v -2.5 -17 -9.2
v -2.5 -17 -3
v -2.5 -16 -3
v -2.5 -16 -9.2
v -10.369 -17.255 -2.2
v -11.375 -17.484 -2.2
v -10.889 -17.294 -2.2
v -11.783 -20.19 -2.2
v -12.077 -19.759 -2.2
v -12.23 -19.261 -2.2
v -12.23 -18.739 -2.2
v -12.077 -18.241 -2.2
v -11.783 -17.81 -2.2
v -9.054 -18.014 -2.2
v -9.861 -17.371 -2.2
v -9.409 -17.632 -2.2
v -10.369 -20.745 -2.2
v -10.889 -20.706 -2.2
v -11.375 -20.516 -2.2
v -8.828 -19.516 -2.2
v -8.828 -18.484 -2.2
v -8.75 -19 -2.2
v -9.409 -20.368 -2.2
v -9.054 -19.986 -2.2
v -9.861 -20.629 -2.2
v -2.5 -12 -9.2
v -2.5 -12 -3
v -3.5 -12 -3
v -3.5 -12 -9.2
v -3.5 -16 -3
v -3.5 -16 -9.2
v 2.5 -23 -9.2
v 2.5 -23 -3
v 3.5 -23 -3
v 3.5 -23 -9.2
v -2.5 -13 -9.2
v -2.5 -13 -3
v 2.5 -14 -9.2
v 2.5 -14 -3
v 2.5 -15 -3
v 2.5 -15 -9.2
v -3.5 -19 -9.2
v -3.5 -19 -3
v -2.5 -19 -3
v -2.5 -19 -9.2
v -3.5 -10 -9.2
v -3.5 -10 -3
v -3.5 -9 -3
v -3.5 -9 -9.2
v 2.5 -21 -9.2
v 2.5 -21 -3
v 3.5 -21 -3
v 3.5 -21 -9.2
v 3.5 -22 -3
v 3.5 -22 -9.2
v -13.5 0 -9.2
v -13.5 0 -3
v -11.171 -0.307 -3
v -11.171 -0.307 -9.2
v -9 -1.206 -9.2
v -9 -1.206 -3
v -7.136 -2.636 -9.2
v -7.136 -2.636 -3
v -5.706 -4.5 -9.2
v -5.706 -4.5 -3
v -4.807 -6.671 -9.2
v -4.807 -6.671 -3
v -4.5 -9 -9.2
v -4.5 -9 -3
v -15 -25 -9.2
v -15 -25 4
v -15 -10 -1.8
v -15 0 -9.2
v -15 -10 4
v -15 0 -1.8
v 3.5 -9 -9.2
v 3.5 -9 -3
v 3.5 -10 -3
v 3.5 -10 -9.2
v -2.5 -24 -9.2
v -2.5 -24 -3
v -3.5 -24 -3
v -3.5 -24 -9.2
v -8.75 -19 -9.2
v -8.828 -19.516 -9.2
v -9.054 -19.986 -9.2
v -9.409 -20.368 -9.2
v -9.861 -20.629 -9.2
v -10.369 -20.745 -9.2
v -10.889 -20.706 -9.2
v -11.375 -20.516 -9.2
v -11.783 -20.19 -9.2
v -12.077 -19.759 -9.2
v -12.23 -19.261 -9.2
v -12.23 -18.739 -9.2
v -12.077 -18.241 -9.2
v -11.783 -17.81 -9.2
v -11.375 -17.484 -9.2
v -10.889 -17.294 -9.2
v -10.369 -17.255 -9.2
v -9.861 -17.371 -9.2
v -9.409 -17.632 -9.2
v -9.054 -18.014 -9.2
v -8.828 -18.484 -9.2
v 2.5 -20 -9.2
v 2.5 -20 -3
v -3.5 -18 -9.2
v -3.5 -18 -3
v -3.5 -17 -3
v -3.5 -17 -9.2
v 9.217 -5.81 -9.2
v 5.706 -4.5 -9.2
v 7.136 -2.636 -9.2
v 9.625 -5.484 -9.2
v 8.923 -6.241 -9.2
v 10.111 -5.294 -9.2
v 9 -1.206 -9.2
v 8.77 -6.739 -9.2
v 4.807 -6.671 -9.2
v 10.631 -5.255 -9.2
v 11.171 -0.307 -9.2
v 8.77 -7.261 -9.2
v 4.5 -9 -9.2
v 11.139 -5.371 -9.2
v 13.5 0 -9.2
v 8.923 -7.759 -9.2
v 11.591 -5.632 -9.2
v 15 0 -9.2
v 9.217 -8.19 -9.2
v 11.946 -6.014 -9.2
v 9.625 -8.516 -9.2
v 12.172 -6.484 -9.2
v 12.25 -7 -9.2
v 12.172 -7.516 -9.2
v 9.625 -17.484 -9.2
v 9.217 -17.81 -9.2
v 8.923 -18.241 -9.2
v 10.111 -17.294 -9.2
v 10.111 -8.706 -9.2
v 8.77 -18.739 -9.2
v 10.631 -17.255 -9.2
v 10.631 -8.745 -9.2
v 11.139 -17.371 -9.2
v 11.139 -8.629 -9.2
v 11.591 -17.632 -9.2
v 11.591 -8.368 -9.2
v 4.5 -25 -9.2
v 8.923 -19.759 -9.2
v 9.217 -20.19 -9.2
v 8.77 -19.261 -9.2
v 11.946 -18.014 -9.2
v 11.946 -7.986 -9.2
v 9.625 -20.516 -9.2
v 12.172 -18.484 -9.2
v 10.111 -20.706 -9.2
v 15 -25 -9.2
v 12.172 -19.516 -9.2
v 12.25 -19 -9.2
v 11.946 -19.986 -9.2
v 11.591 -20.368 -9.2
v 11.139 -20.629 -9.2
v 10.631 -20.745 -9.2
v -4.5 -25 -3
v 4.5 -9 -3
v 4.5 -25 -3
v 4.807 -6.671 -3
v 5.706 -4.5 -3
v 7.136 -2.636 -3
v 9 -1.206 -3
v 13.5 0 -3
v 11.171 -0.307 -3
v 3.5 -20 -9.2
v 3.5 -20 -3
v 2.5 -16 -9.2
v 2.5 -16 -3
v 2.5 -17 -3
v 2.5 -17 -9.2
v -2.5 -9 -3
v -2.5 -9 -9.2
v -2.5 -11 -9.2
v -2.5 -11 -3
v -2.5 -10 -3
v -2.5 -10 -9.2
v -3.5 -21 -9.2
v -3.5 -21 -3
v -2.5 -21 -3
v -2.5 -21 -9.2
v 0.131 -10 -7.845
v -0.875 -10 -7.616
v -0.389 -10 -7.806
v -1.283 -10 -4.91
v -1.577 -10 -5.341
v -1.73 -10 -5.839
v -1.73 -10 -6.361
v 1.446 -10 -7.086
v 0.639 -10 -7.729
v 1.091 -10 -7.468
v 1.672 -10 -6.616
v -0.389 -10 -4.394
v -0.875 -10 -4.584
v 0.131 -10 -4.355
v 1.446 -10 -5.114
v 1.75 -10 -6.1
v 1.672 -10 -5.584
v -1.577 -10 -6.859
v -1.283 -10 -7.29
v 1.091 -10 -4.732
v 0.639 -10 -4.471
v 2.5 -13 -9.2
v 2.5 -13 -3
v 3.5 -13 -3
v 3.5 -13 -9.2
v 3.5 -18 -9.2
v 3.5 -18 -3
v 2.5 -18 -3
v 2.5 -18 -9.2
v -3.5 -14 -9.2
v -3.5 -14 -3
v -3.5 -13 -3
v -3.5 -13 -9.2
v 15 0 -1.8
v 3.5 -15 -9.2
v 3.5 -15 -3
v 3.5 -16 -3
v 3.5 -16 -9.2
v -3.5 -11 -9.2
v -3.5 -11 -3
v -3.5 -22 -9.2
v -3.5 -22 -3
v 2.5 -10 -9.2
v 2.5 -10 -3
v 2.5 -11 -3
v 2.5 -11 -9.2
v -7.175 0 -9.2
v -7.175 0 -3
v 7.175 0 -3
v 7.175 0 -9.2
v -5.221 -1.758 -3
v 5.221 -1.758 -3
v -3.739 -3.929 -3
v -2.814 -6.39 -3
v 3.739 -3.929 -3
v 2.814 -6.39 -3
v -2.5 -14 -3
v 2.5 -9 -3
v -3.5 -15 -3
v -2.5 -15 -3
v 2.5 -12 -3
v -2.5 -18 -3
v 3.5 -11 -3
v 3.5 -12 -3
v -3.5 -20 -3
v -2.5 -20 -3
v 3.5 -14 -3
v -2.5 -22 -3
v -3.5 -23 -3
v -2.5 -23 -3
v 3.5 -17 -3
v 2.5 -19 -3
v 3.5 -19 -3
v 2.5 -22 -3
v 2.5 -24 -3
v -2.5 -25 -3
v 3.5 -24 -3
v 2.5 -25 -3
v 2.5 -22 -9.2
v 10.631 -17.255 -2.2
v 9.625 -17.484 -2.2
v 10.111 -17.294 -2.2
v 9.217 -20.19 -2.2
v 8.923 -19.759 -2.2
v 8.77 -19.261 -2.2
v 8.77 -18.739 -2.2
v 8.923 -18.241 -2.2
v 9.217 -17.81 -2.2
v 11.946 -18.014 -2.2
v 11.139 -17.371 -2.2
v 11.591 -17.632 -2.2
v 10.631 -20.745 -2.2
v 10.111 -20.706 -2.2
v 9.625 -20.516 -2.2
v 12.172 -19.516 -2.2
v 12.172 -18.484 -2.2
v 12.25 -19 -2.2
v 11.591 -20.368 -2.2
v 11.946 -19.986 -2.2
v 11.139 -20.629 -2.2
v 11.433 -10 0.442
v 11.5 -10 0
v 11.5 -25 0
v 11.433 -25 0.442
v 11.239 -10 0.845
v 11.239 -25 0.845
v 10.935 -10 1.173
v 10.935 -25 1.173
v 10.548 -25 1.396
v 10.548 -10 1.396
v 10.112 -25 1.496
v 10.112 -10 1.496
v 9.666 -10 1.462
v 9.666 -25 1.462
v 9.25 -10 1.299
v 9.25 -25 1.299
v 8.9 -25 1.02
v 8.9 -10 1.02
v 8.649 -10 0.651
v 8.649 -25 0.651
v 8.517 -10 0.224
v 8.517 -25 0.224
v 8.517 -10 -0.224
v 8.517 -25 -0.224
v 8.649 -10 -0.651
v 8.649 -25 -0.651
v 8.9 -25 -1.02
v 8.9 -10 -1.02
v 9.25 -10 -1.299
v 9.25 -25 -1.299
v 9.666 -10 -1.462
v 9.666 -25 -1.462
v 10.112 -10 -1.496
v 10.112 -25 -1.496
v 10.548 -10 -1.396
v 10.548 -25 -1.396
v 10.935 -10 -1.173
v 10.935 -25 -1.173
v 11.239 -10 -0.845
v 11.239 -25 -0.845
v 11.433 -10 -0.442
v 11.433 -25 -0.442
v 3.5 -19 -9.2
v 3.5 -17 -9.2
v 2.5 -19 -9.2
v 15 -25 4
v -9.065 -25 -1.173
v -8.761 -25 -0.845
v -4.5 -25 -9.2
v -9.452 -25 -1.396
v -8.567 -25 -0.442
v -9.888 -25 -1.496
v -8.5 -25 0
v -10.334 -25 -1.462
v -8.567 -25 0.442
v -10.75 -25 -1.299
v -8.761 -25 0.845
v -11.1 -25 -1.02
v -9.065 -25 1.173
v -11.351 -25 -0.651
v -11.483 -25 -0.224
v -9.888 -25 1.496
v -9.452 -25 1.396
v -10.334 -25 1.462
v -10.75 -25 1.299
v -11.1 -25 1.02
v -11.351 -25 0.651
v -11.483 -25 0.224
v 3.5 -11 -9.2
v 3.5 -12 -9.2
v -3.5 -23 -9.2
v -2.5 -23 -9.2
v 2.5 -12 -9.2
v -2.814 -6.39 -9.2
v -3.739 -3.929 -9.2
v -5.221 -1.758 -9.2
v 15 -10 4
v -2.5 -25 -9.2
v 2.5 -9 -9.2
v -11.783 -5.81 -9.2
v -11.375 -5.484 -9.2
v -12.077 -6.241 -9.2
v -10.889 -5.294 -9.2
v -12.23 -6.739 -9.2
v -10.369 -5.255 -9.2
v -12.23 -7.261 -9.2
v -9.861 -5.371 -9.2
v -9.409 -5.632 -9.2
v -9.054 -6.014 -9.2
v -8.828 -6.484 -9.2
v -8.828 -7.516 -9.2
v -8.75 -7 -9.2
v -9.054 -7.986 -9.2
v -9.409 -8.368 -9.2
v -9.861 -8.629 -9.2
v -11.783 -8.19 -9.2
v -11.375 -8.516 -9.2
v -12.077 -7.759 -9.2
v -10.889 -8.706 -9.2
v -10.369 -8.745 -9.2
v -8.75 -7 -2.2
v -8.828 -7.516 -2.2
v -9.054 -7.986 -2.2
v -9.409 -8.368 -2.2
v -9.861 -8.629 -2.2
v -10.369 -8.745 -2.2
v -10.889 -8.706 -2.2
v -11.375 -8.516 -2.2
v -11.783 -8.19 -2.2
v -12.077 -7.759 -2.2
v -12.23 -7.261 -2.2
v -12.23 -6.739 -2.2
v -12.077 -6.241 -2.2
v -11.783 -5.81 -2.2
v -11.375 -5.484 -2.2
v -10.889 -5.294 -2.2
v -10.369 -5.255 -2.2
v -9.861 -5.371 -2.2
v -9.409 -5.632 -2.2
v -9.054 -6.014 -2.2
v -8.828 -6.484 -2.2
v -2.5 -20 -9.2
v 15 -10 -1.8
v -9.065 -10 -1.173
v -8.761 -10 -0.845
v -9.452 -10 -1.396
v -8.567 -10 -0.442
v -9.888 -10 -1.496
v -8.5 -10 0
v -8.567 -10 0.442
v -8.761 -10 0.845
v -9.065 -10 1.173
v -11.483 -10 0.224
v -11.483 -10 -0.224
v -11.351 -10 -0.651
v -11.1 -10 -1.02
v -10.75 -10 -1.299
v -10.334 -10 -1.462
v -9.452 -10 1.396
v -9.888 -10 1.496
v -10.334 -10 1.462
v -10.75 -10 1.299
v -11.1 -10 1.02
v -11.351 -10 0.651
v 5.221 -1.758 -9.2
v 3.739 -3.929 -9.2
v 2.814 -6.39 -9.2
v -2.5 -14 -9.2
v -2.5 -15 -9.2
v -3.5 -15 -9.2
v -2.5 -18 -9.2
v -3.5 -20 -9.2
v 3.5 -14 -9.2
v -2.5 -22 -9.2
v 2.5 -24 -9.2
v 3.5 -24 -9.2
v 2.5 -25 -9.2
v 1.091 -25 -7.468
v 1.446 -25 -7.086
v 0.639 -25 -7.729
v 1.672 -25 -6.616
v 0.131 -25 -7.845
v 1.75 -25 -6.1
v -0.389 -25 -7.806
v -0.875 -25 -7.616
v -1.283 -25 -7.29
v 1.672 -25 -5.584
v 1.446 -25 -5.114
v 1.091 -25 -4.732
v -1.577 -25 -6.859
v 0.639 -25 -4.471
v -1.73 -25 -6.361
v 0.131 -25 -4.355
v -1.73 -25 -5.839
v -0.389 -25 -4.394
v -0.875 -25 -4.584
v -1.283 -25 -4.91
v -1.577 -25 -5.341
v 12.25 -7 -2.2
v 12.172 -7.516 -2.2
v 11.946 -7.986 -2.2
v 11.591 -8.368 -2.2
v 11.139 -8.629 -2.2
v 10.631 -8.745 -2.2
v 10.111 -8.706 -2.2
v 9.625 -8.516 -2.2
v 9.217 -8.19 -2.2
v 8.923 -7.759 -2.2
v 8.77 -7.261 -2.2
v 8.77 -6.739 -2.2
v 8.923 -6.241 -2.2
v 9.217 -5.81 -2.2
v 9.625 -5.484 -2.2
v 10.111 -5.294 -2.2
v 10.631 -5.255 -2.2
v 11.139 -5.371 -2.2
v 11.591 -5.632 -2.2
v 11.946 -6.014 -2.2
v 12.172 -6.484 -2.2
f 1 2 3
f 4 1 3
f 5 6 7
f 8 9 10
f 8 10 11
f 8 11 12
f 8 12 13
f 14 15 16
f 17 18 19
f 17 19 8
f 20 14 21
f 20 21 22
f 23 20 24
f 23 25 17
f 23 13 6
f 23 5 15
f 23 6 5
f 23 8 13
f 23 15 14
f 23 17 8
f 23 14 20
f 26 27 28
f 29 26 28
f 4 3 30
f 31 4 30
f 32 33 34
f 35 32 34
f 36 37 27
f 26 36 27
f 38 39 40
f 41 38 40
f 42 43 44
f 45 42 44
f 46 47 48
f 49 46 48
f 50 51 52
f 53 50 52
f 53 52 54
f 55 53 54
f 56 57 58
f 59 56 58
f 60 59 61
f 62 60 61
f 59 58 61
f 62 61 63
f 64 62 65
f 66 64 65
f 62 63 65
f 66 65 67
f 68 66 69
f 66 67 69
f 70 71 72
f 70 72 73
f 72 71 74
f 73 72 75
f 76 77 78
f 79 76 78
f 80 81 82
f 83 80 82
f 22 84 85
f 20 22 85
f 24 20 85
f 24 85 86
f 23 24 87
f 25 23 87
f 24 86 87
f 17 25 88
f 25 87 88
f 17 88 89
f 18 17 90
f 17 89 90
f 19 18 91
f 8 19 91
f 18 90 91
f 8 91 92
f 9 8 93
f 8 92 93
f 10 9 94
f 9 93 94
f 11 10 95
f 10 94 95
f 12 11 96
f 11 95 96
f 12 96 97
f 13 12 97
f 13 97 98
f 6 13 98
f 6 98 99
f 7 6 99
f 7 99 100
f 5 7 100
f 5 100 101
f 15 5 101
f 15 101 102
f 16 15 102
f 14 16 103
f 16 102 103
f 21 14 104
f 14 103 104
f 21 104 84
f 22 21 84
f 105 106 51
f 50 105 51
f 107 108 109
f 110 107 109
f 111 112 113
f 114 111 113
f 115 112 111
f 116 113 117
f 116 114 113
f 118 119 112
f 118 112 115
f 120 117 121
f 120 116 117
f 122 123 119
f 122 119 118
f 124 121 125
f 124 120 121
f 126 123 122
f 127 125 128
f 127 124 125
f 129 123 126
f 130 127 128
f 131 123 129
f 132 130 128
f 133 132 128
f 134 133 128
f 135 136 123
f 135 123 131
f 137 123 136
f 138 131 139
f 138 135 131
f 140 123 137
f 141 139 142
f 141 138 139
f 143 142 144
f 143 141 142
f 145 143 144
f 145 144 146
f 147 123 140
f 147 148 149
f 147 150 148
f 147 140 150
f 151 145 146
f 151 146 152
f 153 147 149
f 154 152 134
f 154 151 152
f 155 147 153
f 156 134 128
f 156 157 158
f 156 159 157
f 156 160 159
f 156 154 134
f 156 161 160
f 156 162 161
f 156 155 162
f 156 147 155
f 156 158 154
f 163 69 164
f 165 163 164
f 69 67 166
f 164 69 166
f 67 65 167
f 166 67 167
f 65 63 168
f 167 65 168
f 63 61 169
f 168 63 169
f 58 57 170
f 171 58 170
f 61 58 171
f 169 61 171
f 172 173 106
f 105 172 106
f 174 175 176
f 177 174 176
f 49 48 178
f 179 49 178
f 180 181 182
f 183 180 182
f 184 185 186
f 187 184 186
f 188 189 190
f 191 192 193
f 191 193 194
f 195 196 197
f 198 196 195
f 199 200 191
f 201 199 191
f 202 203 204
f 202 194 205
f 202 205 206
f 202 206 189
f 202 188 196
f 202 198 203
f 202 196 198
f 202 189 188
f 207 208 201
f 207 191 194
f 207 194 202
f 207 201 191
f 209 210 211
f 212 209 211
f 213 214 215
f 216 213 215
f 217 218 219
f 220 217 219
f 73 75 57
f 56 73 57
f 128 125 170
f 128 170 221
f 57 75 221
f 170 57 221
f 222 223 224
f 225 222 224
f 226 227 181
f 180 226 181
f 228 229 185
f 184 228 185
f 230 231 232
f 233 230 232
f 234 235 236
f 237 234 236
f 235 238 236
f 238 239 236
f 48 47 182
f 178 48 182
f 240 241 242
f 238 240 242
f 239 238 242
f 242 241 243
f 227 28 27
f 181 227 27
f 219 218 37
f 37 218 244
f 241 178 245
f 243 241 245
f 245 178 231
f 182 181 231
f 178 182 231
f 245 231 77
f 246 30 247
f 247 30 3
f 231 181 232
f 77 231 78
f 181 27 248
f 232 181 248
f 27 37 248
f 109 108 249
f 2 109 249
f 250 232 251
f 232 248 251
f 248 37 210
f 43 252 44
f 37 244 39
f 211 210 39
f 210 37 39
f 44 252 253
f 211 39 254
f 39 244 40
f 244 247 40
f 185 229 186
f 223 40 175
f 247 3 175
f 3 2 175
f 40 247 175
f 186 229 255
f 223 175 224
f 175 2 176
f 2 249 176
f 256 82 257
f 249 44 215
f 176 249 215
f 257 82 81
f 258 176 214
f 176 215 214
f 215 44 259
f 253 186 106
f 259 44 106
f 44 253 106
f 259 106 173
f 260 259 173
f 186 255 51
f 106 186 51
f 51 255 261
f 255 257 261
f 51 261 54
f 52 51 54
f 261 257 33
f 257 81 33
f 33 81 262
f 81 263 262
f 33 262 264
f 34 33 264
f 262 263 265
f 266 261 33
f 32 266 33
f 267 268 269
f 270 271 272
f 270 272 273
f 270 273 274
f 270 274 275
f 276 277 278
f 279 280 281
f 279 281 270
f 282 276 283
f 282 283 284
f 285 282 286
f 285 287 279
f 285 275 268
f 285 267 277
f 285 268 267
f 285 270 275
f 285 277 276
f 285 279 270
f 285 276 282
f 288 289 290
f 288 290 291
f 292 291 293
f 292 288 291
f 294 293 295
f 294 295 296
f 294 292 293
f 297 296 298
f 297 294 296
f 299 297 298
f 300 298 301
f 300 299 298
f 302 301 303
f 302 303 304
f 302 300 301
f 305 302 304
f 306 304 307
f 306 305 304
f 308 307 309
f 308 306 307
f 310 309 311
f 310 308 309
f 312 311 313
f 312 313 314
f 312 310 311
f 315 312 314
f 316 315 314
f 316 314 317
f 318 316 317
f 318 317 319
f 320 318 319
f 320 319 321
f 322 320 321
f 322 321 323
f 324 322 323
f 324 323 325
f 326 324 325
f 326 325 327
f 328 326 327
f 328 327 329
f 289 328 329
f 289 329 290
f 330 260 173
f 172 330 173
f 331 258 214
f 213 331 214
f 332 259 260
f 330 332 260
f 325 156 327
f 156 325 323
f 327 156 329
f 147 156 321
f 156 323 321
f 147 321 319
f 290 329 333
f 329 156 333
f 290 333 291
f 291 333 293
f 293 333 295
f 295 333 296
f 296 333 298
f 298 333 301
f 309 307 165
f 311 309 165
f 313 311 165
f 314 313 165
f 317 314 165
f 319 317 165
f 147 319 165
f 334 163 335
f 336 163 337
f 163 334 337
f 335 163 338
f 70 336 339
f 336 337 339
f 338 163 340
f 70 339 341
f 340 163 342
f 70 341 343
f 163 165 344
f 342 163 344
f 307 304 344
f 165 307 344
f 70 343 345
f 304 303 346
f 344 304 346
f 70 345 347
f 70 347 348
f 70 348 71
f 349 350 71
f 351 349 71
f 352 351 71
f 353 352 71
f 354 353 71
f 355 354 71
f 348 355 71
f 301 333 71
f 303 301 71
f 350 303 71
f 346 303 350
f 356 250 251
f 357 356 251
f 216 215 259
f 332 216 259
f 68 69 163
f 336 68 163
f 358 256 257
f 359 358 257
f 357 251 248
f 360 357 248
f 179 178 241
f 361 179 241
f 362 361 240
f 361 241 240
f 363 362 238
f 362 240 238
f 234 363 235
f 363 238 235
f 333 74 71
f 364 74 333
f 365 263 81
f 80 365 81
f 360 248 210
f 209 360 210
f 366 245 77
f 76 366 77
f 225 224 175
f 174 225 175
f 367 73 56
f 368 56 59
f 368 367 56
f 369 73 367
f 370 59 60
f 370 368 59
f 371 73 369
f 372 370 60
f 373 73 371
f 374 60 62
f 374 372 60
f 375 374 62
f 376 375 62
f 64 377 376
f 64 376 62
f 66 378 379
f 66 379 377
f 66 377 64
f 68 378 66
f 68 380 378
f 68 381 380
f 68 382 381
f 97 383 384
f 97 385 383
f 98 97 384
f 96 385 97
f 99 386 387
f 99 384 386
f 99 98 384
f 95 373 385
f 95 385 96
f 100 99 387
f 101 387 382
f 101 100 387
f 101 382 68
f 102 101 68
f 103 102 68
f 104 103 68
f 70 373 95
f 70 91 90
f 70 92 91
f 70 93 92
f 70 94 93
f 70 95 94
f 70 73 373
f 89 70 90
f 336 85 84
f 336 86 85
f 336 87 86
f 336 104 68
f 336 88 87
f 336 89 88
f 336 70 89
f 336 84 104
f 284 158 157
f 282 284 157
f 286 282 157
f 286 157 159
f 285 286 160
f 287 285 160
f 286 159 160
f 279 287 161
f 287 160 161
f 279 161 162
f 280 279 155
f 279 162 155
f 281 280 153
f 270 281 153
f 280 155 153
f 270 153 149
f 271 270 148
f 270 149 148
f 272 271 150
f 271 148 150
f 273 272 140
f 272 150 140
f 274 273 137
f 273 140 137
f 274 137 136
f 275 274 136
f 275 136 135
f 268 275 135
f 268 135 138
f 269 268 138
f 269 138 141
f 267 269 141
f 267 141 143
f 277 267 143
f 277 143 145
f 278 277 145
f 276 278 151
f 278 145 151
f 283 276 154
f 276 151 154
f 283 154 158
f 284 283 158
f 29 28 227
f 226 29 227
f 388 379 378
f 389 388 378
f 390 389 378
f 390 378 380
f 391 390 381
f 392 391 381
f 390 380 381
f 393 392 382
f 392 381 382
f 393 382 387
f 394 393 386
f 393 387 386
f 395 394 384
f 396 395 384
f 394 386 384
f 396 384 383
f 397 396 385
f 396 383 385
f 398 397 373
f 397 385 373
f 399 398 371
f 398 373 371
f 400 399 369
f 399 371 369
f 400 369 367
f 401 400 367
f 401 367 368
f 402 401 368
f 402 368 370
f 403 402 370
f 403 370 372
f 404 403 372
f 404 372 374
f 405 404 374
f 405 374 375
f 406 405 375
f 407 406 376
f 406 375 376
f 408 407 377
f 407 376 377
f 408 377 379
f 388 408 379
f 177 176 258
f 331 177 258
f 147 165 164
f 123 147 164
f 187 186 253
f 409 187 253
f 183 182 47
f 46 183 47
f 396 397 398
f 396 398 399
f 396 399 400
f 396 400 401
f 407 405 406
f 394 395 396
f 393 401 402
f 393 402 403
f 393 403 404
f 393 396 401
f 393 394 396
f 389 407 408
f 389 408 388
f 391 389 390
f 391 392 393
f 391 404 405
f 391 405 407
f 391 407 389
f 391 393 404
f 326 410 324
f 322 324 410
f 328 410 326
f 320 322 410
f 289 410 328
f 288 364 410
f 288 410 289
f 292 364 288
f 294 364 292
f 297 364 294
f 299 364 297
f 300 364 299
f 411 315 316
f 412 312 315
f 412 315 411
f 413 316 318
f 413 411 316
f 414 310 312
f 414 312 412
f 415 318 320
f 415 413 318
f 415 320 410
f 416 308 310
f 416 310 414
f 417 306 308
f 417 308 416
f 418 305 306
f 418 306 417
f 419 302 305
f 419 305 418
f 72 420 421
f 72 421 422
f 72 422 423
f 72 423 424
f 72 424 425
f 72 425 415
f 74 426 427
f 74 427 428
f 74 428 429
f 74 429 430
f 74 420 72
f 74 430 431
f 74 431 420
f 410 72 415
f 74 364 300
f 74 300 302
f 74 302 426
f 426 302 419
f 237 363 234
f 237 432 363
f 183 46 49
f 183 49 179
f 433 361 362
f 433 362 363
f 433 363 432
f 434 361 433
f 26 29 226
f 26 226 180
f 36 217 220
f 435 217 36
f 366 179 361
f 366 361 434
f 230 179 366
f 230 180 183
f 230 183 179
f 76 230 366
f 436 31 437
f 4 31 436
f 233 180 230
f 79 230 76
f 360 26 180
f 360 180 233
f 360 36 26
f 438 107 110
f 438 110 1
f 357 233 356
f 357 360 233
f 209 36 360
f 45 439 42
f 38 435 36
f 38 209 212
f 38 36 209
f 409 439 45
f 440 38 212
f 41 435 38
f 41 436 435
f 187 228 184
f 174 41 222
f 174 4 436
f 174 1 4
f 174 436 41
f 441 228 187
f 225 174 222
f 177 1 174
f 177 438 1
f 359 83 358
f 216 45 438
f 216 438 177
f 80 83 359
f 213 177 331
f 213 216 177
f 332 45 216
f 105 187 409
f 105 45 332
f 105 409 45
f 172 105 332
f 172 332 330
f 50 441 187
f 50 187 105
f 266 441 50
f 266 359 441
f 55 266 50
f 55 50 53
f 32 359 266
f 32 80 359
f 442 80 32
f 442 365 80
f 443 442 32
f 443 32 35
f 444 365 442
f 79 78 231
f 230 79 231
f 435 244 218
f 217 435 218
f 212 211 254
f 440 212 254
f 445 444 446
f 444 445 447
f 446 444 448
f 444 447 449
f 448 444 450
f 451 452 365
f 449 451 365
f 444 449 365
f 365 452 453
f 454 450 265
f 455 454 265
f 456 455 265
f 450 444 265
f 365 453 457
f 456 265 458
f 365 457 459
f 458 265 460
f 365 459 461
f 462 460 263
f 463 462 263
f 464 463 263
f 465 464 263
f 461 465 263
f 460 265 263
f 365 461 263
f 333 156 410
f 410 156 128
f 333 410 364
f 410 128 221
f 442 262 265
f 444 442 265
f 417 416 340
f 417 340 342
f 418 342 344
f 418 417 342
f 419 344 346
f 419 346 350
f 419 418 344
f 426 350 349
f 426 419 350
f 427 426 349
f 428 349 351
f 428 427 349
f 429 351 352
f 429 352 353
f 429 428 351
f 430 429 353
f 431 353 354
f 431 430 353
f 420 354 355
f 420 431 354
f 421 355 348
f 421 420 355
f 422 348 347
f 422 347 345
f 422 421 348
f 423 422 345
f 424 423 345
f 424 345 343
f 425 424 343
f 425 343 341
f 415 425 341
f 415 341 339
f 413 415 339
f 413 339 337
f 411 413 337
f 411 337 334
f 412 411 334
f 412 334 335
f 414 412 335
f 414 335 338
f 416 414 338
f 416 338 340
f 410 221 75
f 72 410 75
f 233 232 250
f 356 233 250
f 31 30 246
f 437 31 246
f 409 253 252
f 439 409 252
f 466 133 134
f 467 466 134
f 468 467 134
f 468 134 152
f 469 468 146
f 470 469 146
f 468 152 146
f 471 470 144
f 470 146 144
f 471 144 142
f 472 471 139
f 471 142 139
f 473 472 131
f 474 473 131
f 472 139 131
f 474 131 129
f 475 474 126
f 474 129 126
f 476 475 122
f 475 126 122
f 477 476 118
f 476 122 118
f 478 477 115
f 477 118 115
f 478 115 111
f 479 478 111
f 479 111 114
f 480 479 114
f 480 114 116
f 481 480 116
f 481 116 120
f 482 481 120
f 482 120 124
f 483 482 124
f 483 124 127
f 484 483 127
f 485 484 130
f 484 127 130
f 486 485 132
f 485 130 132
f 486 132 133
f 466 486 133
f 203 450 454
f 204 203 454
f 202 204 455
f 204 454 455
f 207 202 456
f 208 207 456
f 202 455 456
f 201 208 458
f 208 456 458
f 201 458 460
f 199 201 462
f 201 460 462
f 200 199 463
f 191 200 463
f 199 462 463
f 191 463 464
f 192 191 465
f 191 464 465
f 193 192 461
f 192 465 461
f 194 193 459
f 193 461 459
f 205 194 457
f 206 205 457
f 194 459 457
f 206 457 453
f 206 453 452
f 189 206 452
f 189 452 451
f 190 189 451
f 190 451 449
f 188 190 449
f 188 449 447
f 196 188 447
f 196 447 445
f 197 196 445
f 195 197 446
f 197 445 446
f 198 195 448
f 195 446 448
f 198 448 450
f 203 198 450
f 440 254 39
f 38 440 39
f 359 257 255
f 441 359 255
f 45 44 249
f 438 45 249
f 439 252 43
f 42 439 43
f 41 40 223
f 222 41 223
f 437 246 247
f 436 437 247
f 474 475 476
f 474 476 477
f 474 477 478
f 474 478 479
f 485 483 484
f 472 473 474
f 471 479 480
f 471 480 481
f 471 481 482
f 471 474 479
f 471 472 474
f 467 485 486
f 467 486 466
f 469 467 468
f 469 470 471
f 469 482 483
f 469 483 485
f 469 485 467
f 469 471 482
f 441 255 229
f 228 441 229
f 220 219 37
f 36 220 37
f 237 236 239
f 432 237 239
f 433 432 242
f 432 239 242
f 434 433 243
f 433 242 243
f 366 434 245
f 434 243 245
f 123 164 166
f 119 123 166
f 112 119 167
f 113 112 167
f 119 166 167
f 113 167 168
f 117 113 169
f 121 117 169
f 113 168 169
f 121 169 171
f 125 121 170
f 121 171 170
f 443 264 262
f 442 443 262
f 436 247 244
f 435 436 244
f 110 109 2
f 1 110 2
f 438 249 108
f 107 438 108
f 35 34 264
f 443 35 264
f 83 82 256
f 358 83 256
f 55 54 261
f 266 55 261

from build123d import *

# Parameters (mm, degrees)
F0_W      = 30
F0_H      = 7
F0_R      = 1.5
F1_DEPTH  = 25
F3_DEPTH  = 6.2
F4_DEPTH  = 6.2
F5_R      = 1.75
F6_DEPTH  = 15
F7_R      = 1.75
F8_DEPTH  = 7
F9_W      = 30
F9_H      = 5.8
F9_R      = 1.5
F10_DEPTH = 10


with BuildPart() as f1:
    # F0 (on Front) → F1 (new body)
    with BuildSketch(Plane.XZ):
        with Locations((0, 0.5)):
            Rectangle(F0_W, F0_H)
        with Locations((-10, 0)):
            Circle(F0_R, mode=Mode.SUBTRACT)
        with Locations((10, 0)):
            Circle(F0_R, mode=Mode.SUBTRACT)
    extrude(amount=F1_DEPTH)

    # F2 (on face) → F4 (join)
    with BuildSketch(Plane(origin=(0, 0, -3), x_dir=(1, 0, 0), z_dir=(0, 0, -1))):
        with BuildLine():
            Line((-15, 0), (-13.5, 0))
            ThreePointArc((-13.5, 0), (-7.136039, 2.636039), (-4.5, 9))
            Line((-4.5, 9), (-4.5, 25))
            Line((-4.5, 25), (-15, 25))
            Line((-15, 25), (-15, 0))
        make_face()
        with BuildLine():
            Line((4.5, 25), (4.5, 9))
            ThreePointArc((4.5, 9), (7.136039, 2.636039), (13.5, 0))
            Line((13.5, 0), (15, 0))
            Line((15, 0), (15, 25))
            Line((15, 25), (4.5, 25))
        make_face()
    extrude(amount=F4_DEPTH)

    # F7 (on face) → F8 (cut)
    with BuildSketch(Plane(origin=(0, 0, -9.2), x_dir=(1, 0, 0), z_dir=(0, 0, -1))):
        with Locations((10.5, 7)):
            Circle(F7_R)
        with Locations((10.5, 19)):
            Circle(F7_R)
        with Locations((-10.5, 7)):
            Circle(F7_R)
        with Locations((-10.5, 19)):
            Circle(F7_R)
    extrude(amount=-F8_DEPTH, mode=Mode.SUBTRACT)

    # F9 (on face) → F10 (cut)
    with BuildSketch(Plane(origin=(0, 0, 0), x_dir=(-1, 0, 0), z_dir=(0, 1, 0))):
        with Locations((0, 1.1)):
            Rectangle(F9_W, F9_H)
        with Locations((-10, 0)):
            Circle(F9_R, mode=Mode.SUBTRACT)
        with Locations((10, 0)):
            Circle(F9_R, mode=Mode.SUBTRACT)
    extrude(amount=-F10_DEPTH, mode=Mode.SUBTRACT)


with BuildPart() as f3:
    # F2 (on face) → F3 (new body)
    with BuildSketch(Plane(origin=(0, 0, -3), x_dir=(1, 0, 0), z_dir=(0, 0, -1))):
        with BuildLine():
            ThreePointArc((-2.5, 9), (-3.738594, 3.929009), (-7.175445, 0))
            Line((-7.175445, 0), (7.175445, 0))
            ThreePointArc((7.175445, 0), (3.738594, 3.929009), (2.5, 9))
            Line((2.5, 9), (3.5, 9))
            Line((3.5, 9), (3.5, 10))
            Line((3.5, 10), (2.5, 10))
            Line((2.5, 10), (2.5, 11))
            Line((2.5, 11), (3.5, 11))
            Line((3.5, 11), (3.5, 12))
            Line((3.5, 12), (2.5, 12))
            Line((2.5, 12), (2.5, 13))
            Line((2.5, 13), (3.5, 13))
            Line((3.5, 13), (3.5, 14))
            Line((3.5, 14), (2.5, 14))
            Line((2.5, 14), (2.5, 15))
            Line((2.5, 15), (3.5, 15))
            Line((3.5, 15), (3.5, 16))
            Line((3.5, 16), (2.5, 16))
            Line((2.5, 16), (2.5, 17))
            Line((2.5, 17), (3.5, 17))
            Line((3.5, 17), (3.5, 18))
            Line((3.5, 18), (2.5, 18))
            Line((2.5, 18), (2.5, 19))
            Line((2.5, 19), (3.5, 19))
            Line((3.5, 19), (3.5, 20))
            Line((3.5, 20), (2.5, 20))
            Line((2.5, 20), (2.5, 21))
            Line((2.5, 21), (3.5, 21))
            Line((3.5, 21), (3.5, 22))
            Line((3.5, 22), (2.5, 22))
            Line((2.5, 22), (2.5, 23))
            Line((2.5, 23), (3.5, 23))
            Line((3.5, 23), (3.5, 24))
            Line((3.5, 24), (2.5, 24))
            Line((2.5, 24), (2.5, 25))
            Line((2.5, 25), (-2.5, 25))
            Line((-2.5, 25), (-2.5, 24))
            Line((-2.5, 24), (-3.5, 24))
            Line((-3.5, 24), (-3.5, 23))
            Line((-3.5, 23), (-2.5, 23))
            Line((-2.5, 23), (-2.5, 22))
            Line((-2.5, 22), (-3.5, 22))
            Line((-3.5, 22), (-3.5, 21))
            Line((-3.5, 21), (-2.5, 21))
            Line((-2.5, 21), (-2.5, 20))
            Line((-2.5, 20), (-3.5, 20))
            Line((-3.5, 20), (-3.5, 19))
            Line((-3.5, 19), (-2.5, 19))
            Line((-2.5, 19), (-2.5, 18))
            Line((-2.5, 18), (-3.5, 18))
            Line((-3.5, 18), (-3.5, 17))
            Line((-3.5, 17), (-2.5, 17))
            Line((-2.5, 17), (-2.5, 16))
            Line((-2.5, 16), (-3.5, 16))
            Line((-3.5, 16), (-3.5, 15))
            Line((-3.5, 15), (-2.5, 15))
            Line((-2.5, 15), (-2.5, 14))
            Line((-2.5, 14), (-3.5, 14))
            Line((-3.5, 14), (-3.5, 13))
            Line((-3.5, 13), (-2.5, 13))
            Line((-2.5, 13), (-2.5, 12))
            Line((-2.5, 12), (-3.5, 12))
            Line((-3.5, 12), (-3.5, 11))
            Line((-3.5, 11), (-2.5, 11))
            Line((-2.5, 11), (-2.5, 10))
            Line((-2.5, 10), (-3.5, 10))
            Line((-3.5, 10), (-3.5, 9))
            Line((-3.5, 9), (-2.5, 9))
        make_face()
    extrude(amount=F3_DEPTH)

    # F5 (on face) → F6 (cut)
    with BuildSketch(Plane.XZ.offset(25)):
        with Locations((0, -6.1)):
            Circle(F5_R)
    extrude(amount=-F6_DEPTH, mode=Mode.SUBTRACT)


solid = Compound([f1.part, f3.part])
